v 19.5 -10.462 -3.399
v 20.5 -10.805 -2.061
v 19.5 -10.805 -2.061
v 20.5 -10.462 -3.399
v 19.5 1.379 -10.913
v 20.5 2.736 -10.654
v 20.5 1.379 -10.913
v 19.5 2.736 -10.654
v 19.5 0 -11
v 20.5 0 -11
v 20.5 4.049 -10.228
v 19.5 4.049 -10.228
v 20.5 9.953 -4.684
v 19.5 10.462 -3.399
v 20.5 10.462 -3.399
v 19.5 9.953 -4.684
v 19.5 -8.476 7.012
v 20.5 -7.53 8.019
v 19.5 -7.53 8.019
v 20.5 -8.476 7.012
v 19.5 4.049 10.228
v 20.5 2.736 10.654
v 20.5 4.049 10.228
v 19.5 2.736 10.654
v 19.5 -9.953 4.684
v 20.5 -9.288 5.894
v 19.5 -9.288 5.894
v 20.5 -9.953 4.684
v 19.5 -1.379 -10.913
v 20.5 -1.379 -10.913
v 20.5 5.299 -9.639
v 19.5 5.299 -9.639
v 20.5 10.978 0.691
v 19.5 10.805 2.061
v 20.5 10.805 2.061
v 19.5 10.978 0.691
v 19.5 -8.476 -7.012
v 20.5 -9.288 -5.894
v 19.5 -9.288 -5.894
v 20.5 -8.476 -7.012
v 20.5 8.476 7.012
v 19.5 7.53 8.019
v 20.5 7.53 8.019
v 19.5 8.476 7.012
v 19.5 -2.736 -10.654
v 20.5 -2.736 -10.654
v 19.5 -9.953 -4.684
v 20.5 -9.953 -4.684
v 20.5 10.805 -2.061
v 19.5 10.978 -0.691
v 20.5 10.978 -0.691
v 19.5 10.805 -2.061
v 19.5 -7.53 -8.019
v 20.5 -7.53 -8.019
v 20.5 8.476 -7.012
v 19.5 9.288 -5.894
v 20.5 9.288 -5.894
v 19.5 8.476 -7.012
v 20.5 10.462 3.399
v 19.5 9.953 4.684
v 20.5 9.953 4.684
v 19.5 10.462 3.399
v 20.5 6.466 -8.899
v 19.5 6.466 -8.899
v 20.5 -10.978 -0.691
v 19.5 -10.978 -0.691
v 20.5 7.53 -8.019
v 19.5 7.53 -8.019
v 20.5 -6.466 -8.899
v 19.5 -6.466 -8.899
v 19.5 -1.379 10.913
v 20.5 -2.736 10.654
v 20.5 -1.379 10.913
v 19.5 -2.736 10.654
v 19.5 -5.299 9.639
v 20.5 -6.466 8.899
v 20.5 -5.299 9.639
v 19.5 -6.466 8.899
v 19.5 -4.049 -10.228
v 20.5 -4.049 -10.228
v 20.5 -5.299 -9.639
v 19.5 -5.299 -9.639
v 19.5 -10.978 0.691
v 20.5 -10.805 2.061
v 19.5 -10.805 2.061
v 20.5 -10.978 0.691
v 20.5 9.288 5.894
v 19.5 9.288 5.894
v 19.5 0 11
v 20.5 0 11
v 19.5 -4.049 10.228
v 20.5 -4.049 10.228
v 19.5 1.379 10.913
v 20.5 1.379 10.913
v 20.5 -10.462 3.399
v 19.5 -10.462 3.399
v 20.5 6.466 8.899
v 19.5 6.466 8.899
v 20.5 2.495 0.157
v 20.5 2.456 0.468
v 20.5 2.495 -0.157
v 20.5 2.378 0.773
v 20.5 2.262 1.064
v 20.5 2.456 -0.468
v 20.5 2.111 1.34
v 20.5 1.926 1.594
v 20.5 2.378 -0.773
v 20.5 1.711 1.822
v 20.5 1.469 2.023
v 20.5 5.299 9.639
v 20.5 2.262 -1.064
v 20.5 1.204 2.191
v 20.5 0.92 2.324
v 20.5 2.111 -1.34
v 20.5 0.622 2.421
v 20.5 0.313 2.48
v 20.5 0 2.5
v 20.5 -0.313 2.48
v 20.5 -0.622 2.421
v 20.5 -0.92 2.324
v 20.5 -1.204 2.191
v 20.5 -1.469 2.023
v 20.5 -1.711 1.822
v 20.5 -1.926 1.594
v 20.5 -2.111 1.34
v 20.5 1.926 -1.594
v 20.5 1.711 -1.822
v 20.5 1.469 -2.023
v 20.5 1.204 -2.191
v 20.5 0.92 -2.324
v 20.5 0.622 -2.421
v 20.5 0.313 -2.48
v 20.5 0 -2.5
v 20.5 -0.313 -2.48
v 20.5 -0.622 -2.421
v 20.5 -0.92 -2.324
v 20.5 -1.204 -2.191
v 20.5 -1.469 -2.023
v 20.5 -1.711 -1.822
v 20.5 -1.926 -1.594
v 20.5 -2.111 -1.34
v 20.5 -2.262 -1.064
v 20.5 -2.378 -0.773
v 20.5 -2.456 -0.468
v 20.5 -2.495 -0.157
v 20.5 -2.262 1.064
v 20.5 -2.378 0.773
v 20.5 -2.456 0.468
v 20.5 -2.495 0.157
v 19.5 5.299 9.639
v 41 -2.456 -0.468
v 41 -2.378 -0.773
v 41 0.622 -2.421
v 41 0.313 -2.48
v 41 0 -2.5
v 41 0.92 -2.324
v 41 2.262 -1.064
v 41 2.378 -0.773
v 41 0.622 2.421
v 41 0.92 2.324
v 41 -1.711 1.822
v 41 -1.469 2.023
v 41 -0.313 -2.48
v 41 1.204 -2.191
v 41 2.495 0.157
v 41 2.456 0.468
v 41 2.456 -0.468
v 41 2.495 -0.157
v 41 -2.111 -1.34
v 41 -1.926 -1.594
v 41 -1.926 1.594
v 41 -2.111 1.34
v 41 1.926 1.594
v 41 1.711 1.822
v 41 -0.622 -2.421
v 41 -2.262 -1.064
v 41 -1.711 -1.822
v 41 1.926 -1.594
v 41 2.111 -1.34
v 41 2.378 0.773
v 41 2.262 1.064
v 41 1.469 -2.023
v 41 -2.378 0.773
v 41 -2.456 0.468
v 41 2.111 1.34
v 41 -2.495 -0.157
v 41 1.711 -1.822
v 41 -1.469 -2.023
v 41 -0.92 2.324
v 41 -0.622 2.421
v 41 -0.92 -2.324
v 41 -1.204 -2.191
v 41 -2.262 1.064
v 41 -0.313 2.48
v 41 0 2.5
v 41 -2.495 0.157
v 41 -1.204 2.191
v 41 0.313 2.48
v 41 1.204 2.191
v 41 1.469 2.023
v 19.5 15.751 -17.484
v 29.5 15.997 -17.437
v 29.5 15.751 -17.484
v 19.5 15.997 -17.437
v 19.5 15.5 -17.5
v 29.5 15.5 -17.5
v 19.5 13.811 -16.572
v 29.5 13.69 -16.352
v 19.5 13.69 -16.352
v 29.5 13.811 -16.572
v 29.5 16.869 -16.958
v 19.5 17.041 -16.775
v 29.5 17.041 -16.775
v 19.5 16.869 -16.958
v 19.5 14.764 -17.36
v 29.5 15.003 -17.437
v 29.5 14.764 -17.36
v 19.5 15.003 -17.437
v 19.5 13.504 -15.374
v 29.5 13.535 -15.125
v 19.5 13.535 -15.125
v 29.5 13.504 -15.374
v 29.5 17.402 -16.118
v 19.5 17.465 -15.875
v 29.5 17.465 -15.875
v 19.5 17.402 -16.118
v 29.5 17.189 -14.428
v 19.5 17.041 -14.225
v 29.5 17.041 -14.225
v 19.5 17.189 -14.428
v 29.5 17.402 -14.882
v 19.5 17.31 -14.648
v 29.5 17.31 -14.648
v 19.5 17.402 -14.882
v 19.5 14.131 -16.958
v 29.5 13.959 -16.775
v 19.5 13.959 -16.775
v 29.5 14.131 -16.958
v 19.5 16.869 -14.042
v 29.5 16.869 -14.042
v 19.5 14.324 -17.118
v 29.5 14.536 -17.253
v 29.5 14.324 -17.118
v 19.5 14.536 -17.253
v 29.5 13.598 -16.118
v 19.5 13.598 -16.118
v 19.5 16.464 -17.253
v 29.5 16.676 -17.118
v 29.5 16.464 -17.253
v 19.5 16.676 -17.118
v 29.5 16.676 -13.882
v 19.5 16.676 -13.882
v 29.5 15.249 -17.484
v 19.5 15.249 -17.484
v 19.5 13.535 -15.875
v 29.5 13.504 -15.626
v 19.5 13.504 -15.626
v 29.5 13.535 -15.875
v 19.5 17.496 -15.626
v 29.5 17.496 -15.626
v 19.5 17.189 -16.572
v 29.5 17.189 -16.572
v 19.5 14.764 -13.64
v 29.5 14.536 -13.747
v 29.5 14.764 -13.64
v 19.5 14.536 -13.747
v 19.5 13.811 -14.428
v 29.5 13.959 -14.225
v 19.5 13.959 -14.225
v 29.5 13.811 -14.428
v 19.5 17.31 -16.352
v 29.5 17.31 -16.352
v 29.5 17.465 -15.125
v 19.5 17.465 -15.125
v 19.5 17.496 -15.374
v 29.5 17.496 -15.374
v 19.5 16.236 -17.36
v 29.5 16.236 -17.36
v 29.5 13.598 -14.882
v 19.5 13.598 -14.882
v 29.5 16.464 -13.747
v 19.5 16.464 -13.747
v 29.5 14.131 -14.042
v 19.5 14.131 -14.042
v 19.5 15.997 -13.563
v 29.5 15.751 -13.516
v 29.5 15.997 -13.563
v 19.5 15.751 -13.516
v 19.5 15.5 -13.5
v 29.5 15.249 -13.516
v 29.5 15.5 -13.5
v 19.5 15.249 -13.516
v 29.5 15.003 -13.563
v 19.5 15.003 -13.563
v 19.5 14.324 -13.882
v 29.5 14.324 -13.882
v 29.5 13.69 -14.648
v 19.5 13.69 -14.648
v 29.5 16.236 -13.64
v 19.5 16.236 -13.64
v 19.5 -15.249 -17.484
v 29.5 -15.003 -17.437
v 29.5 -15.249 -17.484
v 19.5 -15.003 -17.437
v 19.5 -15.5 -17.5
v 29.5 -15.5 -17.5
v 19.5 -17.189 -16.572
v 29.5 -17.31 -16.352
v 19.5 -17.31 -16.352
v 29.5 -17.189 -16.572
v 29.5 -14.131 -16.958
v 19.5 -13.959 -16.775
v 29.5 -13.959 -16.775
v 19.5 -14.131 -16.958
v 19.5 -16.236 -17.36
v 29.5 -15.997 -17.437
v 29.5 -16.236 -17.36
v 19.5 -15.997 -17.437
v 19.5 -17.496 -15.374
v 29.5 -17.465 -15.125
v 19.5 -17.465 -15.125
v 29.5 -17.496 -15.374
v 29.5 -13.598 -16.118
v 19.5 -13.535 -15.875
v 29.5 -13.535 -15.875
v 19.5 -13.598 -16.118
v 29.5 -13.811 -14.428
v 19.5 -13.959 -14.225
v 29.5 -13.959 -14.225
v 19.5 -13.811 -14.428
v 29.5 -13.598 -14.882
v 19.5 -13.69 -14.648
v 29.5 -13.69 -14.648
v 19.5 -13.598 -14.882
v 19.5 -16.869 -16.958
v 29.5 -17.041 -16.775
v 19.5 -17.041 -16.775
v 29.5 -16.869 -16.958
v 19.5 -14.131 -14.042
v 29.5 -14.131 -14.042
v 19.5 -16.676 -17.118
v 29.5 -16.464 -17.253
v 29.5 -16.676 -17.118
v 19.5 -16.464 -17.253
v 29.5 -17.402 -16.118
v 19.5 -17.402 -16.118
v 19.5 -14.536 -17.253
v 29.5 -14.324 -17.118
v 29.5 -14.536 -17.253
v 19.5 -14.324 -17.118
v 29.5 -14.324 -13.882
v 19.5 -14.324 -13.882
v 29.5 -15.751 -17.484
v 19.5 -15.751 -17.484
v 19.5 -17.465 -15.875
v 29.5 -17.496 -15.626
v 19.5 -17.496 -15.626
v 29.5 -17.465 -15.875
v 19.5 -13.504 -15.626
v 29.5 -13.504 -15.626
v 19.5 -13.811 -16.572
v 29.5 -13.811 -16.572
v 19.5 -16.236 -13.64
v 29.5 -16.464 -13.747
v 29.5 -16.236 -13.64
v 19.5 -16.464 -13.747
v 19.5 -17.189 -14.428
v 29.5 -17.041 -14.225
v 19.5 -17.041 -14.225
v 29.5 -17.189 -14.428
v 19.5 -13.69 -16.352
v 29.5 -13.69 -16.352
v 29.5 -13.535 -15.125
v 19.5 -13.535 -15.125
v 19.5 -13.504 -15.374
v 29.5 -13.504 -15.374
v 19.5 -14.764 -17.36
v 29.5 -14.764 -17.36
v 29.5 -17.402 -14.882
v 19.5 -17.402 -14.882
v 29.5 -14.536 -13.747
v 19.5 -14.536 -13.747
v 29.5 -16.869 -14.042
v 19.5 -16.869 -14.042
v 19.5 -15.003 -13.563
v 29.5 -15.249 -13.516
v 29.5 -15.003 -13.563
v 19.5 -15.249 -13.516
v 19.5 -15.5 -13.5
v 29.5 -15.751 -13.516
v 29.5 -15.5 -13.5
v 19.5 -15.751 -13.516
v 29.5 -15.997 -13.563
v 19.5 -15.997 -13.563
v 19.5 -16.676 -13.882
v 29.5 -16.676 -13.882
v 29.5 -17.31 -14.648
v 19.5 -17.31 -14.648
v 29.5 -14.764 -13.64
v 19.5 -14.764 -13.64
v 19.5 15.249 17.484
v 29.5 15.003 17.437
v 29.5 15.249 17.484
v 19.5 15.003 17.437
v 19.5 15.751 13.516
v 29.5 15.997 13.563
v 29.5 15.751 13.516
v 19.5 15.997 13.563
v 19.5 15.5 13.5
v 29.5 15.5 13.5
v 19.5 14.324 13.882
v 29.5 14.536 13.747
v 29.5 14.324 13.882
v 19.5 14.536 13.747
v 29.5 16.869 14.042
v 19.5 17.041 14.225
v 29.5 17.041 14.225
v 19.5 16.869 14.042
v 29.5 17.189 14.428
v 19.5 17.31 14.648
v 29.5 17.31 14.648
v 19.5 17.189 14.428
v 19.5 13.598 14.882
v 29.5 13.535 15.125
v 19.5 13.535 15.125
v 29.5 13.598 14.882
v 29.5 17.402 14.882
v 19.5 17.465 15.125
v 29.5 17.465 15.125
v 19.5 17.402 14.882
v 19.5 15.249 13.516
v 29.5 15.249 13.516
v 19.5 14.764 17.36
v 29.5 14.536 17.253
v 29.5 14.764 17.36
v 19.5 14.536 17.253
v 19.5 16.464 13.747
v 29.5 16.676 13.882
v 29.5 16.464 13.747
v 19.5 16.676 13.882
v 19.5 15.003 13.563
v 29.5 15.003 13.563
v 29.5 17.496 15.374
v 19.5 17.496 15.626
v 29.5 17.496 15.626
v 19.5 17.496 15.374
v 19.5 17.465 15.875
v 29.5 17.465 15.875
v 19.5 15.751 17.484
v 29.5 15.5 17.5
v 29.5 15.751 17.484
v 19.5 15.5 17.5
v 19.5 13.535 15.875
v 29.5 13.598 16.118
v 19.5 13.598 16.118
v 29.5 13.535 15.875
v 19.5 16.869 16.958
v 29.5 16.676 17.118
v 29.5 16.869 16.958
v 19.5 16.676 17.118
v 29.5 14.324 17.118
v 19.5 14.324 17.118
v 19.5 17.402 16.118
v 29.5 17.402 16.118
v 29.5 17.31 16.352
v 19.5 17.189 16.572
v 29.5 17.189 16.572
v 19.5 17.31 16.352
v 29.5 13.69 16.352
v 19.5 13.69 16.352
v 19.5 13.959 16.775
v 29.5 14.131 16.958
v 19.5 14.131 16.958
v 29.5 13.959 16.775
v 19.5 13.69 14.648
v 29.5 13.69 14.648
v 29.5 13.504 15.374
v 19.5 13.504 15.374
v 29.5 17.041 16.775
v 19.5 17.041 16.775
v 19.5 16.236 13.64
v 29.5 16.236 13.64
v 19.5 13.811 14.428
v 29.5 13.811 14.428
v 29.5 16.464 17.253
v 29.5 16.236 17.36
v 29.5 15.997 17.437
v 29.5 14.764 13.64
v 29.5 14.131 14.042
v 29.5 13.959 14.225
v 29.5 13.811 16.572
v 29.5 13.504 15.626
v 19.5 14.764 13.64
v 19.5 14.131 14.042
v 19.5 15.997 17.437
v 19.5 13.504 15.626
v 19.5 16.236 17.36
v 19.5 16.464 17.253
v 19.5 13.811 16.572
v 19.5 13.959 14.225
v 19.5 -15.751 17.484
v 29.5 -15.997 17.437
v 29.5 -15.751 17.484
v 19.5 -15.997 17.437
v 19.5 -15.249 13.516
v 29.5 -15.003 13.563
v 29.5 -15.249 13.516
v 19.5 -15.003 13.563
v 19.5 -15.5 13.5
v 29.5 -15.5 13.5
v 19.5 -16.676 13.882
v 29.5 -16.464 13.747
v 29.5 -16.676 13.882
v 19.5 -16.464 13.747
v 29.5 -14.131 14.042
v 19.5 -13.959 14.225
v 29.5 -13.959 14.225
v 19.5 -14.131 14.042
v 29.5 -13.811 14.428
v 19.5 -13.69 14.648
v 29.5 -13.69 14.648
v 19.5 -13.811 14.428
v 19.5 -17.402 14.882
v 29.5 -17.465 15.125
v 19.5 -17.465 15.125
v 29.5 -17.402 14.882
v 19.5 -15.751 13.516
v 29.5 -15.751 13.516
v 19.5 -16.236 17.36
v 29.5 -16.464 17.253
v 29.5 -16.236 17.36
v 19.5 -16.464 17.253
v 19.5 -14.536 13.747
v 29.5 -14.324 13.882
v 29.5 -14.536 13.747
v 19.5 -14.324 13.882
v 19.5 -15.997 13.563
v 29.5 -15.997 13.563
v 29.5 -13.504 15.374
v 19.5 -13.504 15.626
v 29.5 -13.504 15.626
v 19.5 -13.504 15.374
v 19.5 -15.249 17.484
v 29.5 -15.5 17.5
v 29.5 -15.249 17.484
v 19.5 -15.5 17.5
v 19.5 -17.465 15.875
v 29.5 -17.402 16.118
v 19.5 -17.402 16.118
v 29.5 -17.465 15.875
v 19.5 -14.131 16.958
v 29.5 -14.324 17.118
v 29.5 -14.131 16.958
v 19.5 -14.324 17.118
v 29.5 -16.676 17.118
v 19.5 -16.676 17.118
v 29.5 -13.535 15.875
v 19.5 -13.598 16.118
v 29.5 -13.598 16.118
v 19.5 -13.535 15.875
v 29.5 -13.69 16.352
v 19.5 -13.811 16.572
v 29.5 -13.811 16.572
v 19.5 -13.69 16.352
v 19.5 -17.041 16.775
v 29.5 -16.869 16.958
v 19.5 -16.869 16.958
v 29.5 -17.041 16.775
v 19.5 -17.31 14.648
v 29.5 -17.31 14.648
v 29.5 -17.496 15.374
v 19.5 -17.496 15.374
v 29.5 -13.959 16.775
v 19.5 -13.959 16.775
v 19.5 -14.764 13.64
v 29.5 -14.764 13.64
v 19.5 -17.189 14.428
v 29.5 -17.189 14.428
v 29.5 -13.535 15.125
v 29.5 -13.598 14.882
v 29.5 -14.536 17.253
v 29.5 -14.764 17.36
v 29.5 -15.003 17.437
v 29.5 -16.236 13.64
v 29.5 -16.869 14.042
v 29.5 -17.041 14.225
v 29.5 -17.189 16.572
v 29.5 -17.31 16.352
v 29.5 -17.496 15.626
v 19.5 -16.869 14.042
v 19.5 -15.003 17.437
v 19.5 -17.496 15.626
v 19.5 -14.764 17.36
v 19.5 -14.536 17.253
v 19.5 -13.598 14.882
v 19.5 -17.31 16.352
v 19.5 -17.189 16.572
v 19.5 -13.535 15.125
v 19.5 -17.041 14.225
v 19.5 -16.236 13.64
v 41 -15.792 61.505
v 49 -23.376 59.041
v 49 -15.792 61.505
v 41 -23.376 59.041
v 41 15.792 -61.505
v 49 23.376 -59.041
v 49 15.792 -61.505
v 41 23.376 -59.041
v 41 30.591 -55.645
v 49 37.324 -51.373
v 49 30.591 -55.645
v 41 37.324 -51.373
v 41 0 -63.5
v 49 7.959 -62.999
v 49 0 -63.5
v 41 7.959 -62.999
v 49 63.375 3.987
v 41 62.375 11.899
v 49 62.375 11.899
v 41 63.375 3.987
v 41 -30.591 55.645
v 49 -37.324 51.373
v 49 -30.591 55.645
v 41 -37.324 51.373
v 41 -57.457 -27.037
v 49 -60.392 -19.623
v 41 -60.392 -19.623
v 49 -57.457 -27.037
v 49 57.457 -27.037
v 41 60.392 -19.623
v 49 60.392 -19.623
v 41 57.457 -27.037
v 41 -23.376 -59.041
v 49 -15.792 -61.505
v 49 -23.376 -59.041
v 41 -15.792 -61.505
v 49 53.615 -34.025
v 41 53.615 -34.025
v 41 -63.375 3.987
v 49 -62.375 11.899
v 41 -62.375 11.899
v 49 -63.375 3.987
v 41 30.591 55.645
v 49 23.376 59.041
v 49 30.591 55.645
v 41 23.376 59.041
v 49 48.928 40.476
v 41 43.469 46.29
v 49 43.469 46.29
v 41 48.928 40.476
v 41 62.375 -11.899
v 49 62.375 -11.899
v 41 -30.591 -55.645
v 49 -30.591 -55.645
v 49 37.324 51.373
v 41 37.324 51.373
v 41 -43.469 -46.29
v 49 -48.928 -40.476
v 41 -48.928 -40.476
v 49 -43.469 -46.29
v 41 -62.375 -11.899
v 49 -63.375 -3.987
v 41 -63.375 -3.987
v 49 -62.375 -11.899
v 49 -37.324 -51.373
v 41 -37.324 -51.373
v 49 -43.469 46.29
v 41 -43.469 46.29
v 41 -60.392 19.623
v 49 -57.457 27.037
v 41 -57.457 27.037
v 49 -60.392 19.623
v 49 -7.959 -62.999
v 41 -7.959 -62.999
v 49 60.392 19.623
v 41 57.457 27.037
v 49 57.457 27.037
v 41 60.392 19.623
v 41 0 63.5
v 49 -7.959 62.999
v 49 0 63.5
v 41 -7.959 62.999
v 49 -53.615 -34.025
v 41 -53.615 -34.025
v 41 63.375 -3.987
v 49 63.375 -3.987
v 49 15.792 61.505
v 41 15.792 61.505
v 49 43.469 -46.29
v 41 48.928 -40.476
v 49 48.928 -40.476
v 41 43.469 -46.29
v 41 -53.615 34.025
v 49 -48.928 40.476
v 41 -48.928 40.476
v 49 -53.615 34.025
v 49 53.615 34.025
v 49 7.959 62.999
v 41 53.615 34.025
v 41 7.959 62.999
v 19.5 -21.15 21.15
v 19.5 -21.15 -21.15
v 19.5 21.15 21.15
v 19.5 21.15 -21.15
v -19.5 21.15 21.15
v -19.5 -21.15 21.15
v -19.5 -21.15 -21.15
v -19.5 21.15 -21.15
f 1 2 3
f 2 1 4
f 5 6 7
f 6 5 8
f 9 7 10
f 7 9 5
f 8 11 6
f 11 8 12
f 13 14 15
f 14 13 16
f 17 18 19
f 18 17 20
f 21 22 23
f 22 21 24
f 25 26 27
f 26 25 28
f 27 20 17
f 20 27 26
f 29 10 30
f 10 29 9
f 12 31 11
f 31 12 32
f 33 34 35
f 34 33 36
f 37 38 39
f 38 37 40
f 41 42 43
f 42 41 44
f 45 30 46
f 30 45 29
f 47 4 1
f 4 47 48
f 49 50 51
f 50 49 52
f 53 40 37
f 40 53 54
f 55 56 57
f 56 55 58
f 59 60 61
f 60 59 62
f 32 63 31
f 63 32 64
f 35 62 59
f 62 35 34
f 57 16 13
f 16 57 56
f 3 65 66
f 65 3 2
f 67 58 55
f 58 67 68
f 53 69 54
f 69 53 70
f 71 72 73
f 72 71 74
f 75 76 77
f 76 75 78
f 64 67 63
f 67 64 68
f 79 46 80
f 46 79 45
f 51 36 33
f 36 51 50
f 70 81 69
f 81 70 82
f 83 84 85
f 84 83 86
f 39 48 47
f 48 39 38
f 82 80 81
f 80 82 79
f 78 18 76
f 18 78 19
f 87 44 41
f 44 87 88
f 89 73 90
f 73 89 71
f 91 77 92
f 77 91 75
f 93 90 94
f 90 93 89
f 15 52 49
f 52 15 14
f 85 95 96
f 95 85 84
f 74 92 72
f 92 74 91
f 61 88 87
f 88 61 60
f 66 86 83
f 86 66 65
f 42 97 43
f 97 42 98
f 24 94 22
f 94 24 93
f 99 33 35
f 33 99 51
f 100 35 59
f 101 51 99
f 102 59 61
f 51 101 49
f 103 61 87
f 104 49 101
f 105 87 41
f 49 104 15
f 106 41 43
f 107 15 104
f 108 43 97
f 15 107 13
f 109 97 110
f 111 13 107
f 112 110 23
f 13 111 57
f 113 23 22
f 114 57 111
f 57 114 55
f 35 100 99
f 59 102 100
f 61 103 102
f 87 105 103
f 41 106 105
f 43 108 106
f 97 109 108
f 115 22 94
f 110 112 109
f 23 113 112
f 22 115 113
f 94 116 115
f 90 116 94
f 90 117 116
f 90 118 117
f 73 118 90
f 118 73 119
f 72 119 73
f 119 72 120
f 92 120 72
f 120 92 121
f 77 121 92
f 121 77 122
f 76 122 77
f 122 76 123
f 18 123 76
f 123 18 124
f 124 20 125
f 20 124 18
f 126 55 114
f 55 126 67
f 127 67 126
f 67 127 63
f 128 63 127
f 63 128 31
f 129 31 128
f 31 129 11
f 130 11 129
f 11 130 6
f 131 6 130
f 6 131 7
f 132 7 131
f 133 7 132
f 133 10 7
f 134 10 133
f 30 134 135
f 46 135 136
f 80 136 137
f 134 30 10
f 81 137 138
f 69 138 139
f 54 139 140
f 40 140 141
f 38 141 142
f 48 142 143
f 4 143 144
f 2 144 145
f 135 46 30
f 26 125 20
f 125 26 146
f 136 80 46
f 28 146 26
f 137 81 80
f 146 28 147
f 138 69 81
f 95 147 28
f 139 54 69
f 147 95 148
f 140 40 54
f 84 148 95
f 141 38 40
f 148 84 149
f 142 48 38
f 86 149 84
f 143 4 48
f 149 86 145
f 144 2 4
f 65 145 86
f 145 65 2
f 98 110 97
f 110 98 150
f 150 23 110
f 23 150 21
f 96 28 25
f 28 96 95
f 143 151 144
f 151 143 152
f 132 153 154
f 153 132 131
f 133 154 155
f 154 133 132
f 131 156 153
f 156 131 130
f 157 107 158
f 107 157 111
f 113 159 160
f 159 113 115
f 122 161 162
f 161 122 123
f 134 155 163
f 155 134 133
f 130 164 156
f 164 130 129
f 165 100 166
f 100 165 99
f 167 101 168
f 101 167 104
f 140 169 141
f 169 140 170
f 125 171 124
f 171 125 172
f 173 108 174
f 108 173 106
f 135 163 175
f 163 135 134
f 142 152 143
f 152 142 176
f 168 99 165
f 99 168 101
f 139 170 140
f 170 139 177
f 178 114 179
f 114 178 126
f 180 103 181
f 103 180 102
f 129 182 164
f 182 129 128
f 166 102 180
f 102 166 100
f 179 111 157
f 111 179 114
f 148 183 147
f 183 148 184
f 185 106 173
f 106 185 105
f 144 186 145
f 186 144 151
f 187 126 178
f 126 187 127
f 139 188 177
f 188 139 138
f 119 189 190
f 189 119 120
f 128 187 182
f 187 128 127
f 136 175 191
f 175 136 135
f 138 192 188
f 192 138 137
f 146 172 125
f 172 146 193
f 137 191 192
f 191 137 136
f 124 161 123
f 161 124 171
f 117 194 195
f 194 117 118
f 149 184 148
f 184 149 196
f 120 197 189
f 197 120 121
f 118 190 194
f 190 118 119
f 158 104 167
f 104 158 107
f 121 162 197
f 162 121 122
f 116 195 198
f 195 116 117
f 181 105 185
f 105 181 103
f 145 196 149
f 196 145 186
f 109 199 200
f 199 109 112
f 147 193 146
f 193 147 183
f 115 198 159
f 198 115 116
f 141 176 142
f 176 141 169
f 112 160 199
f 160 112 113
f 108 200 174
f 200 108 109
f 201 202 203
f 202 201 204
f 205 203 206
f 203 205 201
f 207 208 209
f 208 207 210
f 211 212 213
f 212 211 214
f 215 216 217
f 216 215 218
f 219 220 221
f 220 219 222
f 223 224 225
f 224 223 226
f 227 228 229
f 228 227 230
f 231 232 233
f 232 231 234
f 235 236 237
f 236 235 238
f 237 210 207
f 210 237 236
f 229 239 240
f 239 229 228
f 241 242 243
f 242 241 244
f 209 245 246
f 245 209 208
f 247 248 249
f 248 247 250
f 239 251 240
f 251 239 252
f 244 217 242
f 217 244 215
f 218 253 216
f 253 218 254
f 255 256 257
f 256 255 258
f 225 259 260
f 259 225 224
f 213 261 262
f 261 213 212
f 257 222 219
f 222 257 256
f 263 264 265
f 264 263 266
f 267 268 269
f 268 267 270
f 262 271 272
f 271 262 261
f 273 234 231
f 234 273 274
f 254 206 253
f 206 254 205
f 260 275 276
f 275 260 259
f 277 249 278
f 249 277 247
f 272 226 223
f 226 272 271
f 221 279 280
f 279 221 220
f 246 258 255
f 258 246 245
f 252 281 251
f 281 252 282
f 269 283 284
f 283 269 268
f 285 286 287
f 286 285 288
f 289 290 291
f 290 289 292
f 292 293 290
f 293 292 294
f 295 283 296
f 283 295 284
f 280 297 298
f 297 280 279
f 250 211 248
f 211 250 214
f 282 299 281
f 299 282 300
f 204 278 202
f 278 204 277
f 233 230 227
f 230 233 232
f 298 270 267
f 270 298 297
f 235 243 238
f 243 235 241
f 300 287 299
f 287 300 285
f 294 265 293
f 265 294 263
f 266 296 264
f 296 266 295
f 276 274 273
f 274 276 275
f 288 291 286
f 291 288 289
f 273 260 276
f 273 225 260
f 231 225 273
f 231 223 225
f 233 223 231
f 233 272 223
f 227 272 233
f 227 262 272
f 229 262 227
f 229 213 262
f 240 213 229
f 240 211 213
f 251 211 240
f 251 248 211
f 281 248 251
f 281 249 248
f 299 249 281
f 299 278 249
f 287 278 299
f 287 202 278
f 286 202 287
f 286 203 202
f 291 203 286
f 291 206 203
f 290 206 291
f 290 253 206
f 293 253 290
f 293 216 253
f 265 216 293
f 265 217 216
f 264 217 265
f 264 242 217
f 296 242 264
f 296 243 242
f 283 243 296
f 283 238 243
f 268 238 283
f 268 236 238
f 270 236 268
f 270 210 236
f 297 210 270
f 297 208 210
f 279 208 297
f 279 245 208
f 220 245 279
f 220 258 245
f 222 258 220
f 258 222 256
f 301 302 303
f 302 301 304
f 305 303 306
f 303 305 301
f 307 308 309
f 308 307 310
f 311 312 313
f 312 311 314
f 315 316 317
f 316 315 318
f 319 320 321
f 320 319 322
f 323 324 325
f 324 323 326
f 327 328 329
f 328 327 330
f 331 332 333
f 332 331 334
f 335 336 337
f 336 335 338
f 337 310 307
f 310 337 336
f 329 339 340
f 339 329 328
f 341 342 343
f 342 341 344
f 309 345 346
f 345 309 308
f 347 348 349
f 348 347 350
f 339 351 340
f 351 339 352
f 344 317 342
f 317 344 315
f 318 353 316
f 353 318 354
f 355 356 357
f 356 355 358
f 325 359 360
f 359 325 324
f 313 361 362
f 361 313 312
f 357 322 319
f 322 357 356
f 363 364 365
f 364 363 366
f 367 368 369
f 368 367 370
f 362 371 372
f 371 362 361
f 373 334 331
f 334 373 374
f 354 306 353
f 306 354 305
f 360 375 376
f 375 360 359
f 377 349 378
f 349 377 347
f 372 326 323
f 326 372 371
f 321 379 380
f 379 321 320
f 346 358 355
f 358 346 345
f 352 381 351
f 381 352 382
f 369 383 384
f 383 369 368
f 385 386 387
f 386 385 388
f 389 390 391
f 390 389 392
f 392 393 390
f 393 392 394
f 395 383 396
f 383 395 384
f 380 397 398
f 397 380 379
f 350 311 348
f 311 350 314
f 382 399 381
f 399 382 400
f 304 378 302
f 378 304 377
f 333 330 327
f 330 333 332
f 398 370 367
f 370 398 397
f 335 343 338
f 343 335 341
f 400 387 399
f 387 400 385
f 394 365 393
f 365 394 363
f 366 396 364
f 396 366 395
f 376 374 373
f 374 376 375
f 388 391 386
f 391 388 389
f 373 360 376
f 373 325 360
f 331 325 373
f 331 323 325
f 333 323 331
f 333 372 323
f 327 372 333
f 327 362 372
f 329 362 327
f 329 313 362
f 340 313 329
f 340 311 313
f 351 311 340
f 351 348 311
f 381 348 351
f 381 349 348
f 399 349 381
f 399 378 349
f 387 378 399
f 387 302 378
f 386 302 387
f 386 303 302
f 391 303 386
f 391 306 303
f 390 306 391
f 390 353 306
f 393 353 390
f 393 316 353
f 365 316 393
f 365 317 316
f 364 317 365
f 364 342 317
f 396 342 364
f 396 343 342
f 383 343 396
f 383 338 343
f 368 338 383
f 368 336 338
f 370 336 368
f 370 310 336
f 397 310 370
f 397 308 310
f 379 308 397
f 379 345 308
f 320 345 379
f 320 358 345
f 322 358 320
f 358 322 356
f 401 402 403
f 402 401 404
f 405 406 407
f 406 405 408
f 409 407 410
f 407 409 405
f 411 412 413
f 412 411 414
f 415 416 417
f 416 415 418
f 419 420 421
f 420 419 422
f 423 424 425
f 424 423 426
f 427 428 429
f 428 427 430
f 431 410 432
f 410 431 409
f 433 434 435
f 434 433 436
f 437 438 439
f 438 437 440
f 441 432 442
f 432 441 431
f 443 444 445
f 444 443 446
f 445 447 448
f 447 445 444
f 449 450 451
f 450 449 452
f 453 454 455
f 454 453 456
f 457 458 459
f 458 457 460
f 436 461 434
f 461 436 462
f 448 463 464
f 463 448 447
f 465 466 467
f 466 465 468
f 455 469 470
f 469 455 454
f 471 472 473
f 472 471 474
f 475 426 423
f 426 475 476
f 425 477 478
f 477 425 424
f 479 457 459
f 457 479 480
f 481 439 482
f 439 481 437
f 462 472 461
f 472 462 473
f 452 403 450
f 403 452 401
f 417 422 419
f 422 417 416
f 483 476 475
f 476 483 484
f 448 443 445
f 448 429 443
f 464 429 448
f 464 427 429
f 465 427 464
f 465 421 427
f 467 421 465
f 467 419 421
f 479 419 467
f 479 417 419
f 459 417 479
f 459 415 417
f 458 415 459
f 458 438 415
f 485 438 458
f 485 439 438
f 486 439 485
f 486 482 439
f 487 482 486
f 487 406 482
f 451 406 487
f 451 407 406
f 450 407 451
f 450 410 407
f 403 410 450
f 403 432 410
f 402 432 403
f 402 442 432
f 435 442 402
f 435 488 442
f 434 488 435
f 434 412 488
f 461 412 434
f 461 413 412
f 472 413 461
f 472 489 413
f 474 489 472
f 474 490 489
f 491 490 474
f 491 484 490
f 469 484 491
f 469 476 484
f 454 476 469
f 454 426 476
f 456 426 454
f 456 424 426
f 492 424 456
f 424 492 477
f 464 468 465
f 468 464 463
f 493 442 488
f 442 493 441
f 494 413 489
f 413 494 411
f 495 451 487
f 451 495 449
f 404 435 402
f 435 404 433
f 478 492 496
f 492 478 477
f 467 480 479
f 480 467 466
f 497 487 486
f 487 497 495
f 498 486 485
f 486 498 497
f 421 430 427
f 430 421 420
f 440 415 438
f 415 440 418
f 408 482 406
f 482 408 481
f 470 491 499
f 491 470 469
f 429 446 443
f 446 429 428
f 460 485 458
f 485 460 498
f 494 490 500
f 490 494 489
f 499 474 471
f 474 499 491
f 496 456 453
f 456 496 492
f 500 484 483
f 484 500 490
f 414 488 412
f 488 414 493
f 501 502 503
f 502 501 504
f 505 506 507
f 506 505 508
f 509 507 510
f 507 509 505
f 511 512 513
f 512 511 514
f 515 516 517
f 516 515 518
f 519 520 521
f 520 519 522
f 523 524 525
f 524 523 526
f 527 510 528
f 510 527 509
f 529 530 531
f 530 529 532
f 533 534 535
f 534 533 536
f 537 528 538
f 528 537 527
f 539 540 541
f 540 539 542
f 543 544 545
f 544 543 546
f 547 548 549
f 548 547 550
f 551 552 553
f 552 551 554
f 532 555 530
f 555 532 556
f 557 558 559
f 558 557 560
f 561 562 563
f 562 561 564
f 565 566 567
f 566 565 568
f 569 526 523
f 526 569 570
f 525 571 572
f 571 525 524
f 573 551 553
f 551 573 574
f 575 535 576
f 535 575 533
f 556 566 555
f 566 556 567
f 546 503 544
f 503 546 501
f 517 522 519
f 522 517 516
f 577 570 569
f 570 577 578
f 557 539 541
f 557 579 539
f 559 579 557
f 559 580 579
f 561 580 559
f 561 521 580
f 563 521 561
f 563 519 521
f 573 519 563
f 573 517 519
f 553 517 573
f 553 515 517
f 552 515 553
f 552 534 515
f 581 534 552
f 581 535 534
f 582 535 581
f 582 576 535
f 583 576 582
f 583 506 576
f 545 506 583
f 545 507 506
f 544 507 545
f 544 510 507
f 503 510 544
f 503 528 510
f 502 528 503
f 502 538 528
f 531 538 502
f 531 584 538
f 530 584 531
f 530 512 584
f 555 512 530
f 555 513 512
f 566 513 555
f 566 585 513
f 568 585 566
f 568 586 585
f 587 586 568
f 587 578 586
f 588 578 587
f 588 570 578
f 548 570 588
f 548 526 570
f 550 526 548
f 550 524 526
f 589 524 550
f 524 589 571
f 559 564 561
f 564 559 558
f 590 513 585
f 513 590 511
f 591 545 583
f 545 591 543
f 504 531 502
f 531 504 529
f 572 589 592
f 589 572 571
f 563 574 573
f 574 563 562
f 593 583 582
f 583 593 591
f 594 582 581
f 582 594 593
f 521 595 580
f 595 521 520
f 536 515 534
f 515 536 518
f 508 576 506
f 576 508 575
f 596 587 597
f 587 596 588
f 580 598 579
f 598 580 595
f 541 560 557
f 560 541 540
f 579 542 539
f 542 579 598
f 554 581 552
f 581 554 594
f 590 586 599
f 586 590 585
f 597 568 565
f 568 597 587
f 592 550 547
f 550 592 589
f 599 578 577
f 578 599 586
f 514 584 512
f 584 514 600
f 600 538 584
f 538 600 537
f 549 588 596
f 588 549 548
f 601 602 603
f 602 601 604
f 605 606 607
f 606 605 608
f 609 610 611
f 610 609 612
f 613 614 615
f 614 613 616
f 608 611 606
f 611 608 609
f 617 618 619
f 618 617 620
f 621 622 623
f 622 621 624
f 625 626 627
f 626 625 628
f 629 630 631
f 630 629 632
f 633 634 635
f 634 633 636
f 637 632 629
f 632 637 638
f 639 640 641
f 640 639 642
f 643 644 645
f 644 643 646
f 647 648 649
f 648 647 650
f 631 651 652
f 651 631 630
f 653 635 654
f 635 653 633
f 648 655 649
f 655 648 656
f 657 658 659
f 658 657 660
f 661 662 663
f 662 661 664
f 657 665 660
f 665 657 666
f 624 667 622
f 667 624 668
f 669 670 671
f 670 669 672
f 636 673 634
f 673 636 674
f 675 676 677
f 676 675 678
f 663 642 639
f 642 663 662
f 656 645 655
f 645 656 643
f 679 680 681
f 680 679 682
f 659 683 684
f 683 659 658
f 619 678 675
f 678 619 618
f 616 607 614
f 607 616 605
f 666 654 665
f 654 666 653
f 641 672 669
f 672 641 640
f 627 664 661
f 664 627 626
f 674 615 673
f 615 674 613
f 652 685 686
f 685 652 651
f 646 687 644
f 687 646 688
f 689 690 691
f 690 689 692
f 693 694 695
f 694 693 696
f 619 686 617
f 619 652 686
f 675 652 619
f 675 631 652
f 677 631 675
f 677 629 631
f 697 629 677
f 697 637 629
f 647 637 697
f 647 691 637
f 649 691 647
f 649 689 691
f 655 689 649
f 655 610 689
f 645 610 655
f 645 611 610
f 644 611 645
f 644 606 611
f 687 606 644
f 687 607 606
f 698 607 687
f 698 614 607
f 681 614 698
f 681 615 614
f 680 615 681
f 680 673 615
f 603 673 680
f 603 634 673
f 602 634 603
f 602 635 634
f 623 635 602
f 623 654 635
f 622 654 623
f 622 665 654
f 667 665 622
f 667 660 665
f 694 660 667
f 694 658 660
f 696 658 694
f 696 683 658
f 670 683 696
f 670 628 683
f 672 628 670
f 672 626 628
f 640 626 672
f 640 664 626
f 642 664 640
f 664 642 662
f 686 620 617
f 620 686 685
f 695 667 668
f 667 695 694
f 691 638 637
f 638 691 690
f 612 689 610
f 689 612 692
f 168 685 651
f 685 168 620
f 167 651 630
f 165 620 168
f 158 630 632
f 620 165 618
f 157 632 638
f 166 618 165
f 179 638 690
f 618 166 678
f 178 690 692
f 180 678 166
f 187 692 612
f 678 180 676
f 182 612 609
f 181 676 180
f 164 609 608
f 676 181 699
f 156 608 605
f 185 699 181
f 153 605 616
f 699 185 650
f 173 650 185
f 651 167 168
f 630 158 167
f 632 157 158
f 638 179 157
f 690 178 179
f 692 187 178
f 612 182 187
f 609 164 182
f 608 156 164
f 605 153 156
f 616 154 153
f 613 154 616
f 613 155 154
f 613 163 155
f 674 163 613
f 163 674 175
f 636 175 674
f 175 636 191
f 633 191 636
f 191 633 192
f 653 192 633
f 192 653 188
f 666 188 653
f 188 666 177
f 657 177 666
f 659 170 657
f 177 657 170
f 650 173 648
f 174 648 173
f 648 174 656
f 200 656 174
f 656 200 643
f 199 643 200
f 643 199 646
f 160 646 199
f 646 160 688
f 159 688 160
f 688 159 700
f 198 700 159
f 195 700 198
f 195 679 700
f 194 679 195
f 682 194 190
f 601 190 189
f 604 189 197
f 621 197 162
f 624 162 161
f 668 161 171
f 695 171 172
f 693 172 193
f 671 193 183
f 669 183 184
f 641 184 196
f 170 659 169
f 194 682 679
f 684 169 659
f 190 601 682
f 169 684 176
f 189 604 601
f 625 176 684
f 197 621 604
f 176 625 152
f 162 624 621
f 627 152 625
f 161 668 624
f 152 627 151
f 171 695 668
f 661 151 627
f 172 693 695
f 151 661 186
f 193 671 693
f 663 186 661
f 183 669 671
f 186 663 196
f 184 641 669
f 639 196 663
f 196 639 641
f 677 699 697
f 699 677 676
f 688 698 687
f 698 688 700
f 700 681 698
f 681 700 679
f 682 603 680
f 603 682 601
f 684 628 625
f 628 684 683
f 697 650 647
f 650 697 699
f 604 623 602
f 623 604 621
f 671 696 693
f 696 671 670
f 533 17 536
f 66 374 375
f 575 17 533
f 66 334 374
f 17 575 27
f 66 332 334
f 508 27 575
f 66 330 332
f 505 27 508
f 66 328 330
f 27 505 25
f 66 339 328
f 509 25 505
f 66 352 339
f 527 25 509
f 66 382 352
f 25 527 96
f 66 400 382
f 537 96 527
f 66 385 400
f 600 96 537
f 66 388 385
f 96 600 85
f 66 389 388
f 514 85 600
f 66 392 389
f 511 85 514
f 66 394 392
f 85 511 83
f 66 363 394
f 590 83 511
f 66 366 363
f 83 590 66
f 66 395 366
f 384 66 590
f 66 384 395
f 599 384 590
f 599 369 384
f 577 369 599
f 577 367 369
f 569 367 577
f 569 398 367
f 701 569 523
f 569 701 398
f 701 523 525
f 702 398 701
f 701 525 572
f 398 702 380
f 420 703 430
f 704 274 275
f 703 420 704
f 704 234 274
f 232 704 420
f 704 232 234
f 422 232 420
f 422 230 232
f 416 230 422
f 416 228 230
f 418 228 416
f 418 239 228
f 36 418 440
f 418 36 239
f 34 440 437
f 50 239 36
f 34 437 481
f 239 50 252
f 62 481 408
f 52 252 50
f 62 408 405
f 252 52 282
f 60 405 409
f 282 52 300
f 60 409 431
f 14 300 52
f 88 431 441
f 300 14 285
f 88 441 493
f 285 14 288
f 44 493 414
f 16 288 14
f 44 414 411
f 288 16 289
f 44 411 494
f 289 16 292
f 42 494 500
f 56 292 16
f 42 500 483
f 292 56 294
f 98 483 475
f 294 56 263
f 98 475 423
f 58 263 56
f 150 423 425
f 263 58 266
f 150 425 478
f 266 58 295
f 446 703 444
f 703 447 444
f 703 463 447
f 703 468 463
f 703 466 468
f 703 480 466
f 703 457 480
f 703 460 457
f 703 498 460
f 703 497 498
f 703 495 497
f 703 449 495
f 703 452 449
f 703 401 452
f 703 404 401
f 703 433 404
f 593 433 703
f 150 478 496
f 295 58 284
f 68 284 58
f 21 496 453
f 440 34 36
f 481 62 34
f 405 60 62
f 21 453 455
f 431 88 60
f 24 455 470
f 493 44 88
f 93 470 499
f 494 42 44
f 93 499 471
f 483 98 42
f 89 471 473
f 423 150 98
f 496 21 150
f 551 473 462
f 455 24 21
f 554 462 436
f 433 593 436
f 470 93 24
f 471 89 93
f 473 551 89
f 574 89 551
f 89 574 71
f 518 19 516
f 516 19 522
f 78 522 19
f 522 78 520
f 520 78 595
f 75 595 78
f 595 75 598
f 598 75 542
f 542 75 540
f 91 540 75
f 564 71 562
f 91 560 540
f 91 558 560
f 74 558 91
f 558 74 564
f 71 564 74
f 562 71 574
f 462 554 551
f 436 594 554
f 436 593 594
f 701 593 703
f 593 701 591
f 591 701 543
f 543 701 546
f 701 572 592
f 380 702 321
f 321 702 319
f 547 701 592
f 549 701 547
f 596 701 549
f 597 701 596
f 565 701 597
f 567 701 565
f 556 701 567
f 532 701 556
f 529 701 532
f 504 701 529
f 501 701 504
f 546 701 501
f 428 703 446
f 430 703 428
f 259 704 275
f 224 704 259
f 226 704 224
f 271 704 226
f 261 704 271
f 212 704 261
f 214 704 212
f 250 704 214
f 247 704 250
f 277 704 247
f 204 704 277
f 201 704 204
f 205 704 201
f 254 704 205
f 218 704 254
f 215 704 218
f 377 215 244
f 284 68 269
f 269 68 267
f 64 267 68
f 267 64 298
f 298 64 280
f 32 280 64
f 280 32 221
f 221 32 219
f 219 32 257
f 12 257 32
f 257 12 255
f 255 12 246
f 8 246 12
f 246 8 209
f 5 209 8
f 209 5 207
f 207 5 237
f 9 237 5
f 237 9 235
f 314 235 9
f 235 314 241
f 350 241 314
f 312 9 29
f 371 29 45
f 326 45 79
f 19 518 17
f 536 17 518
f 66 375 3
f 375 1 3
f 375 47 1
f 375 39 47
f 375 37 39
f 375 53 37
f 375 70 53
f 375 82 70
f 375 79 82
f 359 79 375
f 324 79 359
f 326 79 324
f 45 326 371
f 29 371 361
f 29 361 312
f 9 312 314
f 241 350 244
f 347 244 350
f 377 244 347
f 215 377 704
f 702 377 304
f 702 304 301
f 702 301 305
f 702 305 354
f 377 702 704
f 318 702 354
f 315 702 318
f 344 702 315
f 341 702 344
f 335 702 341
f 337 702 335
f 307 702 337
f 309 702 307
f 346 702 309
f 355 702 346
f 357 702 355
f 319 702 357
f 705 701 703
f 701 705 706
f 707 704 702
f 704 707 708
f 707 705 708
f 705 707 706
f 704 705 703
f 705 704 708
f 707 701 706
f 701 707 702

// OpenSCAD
$fn = 50;



module wheel(){
    translate([45, 0,0]){
        rotate([0,90,0]){
            cylinder(8, d=127,center = true);
            
         }
     }
    
}

module nema17(){
        wheel();
        cube([39, 42.3, 42.3], center = true);
        translate([19.5, 0, 0]){

            for(i=[0:4]){
                rotate([0,90, 0]){
                    translate([15.5, 15.5, 0]){
                        cylinder(20, d = 4, center = true);
                    }
                    translate([15.5, -15.5, 0]){
                        cylinder(20, d = 4, center = true);
                    }
                    translate([-15.5, 15.5, 0]){
                        cylinder(20, d = 4, center = true);
                    }
                    translate([-15.5, -15.5, 0]){
                        cylinder(20, d = 4, center = true);
                    }
                }
            }
        
    }
    
  
}
module shaft(){

    difference(){
        translate([32.5, 0, 0]){
            rotate([0, 90, 0]){
                translate([0, 0, -13]){
                    cylinder(2,d=22, center = true);
                }
                cylinder(26, d = 5, center = true);
            }
        }
    }
}
shaft();
nema17();
